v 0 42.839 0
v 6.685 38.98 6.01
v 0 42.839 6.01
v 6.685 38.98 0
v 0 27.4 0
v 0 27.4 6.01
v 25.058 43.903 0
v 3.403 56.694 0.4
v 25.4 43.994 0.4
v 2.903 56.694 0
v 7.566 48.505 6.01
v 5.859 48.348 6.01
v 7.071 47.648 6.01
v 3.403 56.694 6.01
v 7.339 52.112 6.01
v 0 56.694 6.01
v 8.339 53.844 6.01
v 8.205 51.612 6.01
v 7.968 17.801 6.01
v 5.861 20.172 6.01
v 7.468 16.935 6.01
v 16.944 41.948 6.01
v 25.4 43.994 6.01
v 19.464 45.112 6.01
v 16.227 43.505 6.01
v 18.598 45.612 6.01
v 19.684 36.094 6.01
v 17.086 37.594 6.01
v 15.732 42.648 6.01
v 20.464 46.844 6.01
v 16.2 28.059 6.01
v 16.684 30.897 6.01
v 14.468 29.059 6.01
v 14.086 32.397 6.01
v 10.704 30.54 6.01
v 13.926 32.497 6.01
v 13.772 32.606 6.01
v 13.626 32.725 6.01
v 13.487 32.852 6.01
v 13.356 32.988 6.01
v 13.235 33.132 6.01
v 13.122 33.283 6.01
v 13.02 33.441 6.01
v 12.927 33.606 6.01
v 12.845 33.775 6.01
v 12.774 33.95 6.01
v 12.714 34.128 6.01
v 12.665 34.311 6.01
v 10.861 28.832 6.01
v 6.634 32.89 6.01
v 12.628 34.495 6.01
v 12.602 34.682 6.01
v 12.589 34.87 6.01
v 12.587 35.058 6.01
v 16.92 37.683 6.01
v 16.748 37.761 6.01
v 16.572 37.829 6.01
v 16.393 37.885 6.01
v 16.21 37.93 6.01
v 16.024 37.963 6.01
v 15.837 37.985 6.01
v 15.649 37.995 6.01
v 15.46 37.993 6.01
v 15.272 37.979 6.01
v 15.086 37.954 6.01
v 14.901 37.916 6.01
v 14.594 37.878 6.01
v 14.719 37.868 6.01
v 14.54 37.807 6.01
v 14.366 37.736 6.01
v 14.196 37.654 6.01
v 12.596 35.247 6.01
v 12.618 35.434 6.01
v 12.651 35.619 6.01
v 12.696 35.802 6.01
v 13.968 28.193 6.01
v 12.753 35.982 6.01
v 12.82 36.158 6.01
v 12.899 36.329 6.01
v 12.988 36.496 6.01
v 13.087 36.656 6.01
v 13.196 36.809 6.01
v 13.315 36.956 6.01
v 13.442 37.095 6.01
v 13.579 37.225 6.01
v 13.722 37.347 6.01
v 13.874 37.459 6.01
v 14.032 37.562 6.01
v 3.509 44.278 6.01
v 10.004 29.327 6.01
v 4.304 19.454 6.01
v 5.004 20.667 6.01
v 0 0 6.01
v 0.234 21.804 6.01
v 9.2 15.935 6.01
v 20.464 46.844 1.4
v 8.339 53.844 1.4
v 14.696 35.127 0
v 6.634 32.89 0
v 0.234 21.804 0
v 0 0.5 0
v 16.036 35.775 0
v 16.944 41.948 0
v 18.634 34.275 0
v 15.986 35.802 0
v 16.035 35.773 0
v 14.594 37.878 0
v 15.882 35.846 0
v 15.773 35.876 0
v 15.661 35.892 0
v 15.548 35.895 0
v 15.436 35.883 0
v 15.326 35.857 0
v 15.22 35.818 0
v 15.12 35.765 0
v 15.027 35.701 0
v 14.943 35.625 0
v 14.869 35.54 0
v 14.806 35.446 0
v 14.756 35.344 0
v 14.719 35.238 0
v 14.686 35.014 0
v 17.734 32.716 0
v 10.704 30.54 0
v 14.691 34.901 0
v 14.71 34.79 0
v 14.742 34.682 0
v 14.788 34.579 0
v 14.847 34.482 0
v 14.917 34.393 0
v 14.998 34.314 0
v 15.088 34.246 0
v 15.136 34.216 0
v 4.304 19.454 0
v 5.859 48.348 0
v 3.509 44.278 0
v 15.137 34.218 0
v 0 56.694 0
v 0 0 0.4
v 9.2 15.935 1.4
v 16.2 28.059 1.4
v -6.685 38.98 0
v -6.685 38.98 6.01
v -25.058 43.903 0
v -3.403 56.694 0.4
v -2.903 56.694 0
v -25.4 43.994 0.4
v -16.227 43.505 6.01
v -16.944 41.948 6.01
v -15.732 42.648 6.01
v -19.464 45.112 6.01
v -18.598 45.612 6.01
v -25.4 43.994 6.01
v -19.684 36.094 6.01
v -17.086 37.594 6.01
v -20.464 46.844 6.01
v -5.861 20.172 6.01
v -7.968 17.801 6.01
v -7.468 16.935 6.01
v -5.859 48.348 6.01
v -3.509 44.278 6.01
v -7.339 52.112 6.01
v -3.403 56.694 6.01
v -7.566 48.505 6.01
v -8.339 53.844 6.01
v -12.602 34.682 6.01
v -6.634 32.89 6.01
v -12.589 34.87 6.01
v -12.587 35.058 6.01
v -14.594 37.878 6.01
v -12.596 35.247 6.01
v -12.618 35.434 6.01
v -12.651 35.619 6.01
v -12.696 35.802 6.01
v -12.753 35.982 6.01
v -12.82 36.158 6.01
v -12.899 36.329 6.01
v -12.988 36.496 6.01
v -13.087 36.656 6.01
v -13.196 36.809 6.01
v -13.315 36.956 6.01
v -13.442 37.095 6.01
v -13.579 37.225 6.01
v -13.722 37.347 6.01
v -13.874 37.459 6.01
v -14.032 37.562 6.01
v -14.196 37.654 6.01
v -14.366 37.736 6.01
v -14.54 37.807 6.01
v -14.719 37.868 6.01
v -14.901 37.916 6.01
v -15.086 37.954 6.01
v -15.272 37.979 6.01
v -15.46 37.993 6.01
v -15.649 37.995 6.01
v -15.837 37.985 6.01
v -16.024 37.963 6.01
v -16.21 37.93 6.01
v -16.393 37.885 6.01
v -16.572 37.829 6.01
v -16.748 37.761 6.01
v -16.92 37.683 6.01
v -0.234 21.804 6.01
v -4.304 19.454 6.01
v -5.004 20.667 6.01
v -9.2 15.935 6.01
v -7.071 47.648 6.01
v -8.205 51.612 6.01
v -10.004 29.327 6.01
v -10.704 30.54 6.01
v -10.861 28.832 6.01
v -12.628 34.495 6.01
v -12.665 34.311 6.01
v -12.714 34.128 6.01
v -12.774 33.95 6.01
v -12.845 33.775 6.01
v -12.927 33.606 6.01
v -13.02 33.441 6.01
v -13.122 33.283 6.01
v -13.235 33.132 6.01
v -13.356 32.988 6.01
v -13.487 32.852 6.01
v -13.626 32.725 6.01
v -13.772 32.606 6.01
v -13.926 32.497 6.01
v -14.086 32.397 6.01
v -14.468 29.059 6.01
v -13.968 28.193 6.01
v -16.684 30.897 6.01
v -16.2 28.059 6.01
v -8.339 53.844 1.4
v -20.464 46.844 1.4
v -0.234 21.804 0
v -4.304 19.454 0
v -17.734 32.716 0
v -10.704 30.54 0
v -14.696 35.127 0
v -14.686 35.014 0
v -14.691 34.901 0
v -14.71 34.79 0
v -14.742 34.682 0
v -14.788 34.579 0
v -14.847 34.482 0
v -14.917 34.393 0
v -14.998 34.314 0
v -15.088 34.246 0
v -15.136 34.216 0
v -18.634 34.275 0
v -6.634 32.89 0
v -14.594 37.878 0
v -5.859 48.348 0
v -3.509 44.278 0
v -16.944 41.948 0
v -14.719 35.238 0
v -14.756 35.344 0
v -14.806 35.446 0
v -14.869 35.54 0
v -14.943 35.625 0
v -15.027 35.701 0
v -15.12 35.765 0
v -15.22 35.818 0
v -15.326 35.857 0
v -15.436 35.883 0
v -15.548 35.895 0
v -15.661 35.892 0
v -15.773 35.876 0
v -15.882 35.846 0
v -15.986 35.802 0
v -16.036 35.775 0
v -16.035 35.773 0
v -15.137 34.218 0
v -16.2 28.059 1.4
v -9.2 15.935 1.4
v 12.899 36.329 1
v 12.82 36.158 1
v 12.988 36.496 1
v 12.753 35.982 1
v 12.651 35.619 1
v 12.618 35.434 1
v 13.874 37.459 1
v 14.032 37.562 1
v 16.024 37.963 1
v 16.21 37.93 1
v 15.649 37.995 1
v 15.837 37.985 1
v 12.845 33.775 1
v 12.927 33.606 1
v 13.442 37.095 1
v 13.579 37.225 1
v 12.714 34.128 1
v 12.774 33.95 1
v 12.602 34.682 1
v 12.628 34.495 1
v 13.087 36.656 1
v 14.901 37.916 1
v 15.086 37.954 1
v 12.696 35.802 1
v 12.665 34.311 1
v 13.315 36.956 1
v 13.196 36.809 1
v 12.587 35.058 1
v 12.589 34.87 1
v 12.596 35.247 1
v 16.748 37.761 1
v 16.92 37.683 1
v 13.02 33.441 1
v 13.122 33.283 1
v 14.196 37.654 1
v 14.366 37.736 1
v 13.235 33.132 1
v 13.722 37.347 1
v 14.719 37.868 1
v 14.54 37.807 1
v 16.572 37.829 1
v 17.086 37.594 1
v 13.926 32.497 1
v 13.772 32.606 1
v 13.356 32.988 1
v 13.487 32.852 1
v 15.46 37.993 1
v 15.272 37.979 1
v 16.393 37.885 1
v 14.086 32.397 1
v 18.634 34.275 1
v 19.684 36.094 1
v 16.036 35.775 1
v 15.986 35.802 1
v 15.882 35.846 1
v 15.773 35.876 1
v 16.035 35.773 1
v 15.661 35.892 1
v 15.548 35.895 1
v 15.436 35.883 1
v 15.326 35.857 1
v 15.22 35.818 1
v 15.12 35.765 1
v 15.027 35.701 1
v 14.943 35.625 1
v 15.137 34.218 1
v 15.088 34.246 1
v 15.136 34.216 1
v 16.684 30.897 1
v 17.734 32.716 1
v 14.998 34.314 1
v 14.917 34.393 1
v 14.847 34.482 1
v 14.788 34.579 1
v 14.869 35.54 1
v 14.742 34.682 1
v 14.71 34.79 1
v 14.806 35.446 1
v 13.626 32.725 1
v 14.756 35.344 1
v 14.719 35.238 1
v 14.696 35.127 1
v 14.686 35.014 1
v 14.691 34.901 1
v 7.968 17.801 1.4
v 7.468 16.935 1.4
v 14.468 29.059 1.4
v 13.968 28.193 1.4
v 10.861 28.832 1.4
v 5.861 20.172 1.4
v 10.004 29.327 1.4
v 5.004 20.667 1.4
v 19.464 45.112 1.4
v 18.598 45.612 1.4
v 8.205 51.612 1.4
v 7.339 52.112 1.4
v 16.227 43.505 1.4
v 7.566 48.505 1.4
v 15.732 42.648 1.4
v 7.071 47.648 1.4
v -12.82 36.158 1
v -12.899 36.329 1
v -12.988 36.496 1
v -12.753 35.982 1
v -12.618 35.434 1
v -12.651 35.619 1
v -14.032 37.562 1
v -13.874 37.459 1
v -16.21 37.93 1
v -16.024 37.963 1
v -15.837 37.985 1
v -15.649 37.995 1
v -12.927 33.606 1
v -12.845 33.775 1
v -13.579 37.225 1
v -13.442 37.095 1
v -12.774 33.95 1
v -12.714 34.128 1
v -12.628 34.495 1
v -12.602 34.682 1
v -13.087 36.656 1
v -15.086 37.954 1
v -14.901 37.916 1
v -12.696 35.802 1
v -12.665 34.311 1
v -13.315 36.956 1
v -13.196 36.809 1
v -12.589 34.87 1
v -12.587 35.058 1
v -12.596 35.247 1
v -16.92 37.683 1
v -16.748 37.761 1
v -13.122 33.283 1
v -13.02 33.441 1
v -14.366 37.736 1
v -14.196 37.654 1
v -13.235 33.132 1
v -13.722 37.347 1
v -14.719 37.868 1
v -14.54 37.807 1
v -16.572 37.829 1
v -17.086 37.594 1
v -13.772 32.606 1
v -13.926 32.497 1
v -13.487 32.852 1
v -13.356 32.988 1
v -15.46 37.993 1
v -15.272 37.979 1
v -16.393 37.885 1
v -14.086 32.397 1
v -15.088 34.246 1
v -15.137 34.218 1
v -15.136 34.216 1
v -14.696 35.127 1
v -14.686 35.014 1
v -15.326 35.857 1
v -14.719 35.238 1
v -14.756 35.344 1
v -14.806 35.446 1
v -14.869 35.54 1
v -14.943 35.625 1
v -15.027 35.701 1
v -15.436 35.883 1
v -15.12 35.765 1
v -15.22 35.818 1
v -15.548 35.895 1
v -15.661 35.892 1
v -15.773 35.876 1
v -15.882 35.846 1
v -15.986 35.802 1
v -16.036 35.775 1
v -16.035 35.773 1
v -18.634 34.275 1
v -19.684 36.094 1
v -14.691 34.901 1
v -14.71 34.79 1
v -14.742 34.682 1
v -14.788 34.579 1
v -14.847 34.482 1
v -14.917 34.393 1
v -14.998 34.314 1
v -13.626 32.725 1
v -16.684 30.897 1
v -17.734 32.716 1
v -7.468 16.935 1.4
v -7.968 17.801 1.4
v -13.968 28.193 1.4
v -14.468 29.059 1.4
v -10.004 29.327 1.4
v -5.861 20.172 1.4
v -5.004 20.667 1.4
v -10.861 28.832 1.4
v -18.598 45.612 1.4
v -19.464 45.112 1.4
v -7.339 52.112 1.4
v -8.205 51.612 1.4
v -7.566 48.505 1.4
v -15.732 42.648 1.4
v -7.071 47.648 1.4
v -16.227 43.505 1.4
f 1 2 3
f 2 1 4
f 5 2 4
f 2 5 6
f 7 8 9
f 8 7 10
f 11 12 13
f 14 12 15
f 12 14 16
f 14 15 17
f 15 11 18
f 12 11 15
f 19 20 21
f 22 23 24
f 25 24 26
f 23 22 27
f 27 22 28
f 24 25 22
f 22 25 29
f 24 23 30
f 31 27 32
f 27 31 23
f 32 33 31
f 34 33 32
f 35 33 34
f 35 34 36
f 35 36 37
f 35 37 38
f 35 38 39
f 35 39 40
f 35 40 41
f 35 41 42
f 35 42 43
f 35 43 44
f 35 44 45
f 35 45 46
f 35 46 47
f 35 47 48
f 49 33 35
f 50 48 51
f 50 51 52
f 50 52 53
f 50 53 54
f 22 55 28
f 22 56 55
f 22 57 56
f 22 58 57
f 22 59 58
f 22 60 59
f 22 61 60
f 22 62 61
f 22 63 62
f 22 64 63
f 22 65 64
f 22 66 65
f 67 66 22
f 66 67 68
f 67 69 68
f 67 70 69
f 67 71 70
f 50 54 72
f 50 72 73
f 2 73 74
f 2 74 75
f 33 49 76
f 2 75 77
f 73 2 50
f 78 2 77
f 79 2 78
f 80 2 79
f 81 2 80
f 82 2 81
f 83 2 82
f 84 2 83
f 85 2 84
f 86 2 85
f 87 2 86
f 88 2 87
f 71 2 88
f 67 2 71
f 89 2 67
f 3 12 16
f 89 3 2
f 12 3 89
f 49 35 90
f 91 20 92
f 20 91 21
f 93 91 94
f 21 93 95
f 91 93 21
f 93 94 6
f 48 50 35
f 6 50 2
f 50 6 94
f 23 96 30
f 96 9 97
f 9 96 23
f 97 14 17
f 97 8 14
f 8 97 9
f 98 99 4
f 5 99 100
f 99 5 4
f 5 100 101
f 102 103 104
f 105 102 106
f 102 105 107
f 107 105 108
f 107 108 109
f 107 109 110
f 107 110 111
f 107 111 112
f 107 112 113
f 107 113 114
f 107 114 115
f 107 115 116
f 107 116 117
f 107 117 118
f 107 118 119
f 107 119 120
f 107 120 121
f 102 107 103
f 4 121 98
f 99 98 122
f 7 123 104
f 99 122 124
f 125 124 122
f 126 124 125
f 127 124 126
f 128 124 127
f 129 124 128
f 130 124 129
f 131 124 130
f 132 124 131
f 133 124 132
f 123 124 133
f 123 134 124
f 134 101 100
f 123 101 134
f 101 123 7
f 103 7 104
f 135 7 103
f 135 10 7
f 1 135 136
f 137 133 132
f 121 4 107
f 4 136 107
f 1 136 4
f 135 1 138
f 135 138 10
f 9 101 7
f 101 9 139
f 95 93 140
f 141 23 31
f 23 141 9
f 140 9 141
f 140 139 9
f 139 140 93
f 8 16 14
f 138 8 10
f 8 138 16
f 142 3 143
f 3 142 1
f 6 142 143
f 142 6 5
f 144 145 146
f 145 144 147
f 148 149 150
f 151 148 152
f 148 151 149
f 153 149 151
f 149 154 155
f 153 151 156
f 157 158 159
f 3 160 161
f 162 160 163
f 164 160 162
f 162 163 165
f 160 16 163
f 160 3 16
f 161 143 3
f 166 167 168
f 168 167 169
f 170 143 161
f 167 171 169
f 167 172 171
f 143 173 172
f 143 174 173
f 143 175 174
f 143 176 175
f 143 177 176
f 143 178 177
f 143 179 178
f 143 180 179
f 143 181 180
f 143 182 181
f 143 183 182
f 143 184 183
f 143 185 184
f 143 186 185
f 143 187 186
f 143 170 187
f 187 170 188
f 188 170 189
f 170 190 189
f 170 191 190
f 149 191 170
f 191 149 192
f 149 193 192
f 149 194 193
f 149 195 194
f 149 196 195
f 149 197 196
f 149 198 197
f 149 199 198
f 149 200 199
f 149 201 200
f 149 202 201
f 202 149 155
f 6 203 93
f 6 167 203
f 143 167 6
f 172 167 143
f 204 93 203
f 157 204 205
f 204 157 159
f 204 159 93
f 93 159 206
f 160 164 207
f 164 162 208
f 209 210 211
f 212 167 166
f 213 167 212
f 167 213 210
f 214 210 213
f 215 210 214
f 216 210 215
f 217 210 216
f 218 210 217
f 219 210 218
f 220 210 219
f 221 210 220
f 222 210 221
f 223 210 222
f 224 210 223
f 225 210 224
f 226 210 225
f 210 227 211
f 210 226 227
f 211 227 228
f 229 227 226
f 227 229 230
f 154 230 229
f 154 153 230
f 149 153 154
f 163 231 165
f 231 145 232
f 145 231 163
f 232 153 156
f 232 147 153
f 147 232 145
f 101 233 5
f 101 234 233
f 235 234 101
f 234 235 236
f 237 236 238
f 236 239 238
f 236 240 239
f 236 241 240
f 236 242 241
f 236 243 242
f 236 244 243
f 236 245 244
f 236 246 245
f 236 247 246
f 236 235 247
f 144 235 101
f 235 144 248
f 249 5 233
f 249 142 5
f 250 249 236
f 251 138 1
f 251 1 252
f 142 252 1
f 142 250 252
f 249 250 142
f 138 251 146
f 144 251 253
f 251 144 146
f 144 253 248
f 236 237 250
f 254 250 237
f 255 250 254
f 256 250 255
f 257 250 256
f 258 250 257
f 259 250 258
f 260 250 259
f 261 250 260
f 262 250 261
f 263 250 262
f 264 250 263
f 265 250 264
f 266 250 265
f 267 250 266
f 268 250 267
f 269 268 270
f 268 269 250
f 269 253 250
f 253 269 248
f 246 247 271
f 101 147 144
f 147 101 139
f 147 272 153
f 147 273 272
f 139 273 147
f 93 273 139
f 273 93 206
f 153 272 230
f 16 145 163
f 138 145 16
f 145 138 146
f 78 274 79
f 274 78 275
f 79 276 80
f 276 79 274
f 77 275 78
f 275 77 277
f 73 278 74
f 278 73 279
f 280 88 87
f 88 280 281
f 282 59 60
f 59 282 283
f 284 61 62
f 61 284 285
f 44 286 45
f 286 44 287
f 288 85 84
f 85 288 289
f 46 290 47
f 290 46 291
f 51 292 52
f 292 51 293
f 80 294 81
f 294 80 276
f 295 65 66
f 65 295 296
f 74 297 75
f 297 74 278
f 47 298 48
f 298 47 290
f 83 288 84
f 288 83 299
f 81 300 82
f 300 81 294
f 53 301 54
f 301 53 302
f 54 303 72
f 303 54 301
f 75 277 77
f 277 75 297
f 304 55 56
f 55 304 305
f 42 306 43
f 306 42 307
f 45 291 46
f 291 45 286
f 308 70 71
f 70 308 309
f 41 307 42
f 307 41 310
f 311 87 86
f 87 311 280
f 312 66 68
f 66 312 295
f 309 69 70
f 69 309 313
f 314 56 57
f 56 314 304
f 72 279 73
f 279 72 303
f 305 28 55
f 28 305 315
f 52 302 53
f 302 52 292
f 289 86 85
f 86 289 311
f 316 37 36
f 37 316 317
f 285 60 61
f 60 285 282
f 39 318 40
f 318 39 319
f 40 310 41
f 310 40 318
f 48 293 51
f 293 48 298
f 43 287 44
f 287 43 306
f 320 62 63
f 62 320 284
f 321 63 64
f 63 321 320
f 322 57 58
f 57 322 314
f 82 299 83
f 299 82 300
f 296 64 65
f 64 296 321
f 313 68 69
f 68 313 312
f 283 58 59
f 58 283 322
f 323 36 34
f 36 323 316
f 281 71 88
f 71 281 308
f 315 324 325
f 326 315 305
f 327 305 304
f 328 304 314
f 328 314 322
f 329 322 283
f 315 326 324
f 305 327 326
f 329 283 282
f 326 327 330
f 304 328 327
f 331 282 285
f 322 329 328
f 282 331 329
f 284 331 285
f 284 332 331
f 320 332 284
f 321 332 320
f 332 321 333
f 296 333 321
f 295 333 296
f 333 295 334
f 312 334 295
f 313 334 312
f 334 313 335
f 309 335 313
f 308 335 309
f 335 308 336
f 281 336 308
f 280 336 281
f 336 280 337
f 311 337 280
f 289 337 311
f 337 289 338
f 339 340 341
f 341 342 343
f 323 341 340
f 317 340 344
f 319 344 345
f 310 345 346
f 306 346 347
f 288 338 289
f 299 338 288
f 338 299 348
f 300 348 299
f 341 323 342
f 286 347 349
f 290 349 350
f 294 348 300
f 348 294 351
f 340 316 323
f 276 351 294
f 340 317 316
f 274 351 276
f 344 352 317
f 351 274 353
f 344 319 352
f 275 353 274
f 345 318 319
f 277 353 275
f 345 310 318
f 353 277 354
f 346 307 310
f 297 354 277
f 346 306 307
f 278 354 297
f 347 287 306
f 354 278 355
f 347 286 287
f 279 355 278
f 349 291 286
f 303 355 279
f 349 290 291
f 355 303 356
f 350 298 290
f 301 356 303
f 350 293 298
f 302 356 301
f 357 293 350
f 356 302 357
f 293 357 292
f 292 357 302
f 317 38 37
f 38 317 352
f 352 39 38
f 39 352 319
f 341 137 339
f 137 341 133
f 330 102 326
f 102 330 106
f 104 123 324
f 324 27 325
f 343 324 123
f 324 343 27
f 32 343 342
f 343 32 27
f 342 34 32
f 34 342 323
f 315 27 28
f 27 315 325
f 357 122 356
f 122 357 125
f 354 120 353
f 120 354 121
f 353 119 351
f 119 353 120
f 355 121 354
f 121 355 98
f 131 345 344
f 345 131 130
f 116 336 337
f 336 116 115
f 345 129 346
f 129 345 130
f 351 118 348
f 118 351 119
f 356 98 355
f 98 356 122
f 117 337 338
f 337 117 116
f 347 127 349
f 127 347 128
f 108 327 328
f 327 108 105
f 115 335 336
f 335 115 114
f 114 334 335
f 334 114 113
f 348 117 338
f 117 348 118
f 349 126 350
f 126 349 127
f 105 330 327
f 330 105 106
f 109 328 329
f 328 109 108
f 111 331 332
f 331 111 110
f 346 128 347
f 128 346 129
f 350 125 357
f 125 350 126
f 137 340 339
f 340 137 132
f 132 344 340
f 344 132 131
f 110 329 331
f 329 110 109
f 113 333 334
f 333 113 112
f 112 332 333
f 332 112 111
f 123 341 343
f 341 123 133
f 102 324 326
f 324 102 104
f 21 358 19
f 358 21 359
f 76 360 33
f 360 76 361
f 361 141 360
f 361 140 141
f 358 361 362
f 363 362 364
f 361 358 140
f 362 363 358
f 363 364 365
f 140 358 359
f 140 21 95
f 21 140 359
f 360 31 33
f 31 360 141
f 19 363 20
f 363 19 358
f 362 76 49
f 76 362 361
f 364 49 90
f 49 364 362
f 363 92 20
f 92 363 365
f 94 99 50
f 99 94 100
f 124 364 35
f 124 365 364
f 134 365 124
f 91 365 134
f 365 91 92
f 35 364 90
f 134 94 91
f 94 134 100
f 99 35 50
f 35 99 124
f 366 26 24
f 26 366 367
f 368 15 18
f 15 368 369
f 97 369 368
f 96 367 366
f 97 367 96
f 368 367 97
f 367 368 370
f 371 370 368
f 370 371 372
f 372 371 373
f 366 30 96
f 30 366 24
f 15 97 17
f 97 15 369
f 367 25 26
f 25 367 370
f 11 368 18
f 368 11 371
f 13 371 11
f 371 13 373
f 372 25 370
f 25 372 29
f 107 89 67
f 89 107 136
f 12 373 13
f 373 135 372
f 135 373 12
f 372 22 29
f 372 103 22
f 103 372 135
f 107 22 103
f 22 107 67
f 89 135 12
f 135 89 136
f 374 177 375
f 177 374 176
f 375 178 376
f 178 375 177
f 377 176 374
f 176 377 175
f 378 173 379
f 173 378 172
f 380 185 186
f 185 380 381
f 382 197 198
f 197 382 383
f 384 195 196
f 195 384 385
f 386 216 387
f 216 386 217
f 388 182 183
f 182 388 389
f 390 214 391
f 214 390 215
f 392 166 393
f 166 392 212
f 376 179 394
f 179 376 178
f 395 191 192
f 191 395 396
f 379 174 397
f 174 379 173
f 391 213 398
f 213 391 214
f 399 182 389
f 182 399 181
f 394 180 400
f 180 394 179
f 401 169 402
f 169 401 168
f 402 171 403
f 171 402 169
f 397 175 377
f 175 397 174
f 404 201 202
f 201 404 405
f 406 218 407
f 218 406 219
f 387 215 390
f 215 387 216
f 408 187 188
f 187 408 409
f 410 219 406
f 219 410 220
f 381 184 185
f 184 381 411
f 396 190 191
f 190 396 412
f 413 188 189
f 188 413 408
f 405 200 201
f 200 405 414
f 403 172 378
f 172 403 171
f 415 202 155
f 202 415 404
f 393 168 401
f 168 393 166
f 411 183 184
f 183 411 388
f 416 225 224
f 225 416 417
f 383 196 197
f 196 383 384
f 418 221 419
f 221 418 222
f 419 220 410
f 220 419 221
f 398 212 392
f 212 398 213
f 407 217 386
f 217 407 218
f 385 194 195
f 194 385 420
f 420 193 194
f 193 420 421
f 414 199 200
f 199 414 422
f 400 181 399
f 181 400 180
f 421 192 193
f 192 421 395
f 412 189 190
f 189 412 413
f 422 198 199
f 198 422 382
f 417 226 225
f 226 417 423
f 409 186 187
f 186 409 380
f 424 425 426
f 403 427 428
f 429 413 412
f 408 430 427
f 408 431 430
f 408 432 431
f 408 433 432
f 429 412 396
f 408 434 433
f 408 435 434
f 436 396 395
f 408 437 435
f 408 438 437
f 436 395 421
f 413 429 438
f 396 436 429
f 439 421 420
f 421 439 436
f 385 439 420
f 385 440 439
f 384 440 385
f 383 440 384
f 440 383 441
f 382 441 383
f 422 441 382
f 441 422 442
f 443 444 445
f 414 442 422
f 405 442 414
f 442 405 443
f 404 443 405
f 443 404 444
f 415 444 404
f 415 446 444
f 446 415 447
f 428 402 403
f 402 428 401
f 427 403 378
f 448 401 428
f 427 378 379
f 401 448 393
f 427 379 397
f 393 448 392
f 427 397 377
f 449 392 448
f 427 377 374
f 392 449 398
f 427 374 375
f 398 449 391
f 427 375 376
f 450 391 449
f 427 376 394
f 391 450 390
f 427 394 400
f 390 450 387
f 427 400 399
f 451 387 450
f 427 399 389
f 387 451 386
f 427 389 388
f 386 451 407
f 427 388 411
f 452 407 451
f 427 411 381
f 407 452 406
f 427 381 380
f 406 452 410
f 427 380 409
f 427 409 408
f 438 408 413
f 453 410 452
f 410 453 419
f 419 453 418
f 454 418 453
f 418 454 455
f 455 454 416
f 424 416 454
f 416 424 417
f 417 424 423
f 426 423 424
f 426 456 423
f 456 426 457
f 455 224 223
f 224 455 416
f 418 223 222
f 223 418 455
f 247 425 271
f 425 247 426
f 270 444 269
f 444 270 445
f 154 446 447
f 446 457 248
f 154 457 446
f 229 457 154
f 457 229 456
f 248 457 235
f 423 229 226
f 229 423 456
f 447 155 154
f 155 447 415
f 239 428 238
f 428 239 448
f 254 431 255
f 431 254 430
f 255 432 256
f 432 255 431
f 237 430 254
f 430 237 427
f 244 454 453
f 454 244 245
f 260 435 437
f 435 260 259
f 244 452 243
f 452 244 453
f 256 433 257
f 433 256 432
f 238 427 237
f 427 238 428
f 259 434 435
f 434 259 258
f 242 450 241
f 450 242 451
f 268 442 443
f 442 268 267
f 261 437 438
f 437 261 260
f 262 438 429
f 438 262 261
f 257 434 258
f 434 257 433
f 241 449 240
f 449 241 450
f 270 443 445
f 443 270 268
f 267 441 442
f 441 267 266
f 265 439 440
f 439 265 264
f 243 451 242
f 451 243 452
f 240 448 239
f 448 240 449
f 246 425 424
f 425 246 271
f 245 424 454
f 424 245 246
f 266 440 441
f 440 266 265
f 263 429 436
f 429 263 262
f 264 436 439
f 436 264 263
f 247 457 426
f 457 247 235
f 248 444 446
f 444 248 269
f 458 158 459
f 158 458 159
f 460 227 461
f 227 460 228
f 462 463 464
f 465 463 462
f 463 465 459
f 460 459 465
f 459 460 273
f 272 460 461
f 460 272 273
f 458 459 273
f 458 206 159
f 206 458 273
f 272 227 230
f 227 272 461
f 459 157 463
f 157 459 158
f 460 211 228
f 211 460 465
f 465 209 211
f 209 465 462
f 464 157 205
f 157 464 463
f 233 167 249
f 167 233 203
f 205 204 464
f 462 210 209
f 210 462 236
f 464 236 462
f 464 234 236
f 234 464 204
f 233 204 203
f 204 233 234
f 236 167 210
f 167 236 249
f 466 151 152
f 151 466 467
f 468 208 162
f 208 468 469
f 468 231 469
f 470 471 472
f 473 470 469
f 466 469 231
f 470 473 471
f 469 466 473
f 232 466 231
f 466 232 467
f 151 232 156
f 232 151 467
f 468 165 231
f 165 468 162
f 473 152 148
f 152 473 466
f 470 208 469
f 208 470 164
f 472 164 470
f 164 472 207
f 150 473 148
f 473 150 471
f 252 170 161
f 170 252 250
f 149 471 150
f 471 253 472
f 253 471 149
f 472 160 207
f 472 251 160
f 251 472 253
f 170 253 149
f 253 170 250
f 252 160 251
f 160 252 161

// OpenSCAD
// file: lock_flex_magnetic.scad
/*
 * Flex Magnet
 */
module flex_magnetic_positive(magnet_hole=6, height=6) {
    if (magnet_hole > 0) {
        translate([magnet_hole/2+1,0,0]) cylinder(.41,magnet_hole/2+1-.25,magnet_hole/2+1, $fn=100);
        translate([magnet_hole/2+1,0,0.4]) cylinder(height-.4,magnet_hole/2+1,magnet_hole/2+1, $fn=100);
        hull() {
            translate([0.25,-magnet_hole/2-1+.25,0]) cube([magnet_hole/2+1-.25,magnet_hole+2-.5,1]);
            translate([0,-magnet_hole/2-1,.4]) cube([magnet_hole/2+1,magnet_hole+2,height-.4]);
        }
    }
}

module flex_magnetic_negative(magnet_hole=6, height=6) {
    if (magnet_hole > 0) {
        translate([magnet_hole/2+1,0,1]) cylinder(height+2,magnet_hole/2,magnet_hole/2, $fn=100);
        translate([1,-magnet_hole/2,1]) cube([magnet_hole/2,magnet_hole,height+2]);
        translate([magnet_hole/2+1,0,-1]) cylinder(10,.9,.9,$fn=50);
        translate([1,-.9,-1]) cube([magnet_hole/2,.9*2,10]);
    }
}

module flex_magnetic_hex(square_basis, magnet_hole=6, height=6) {
    if (magnet_hole > 0) {
        hull() {
            translate([square_basis/2,0,0]) rotate([0,0,90]) translate([magnet_hole/2+1,0,1]) cylinder(height+2,magnet_hole/2,magnet_hole/2, $fn=100);
            rotate([0,0,-120]) mirror([1,0,0]) translate([square_basis/2,0,0]) rotate([0,0,90]) translate([magnet_hole/2+1,0,1]) cylinder(height+2,magnet_hole/2,magnet_hole/2, $fn=100);
        }
        translate([square_basis/2,0,0]) rotate([0,0,90]) union() {
            //translate([magnet_hole/2+1,0,1]) cylinder(8,magnet_hole/2,magnet_hole/2, $fn=100);
            translate([1,-magnet_hole/2,1]) cube([magnet_hole/2,magnet_hole,height+2]);
            translate([magnet_hole/2+1,0,-1]) cylinder(10,.9,.9,$fn=50);
            translate([1,-.9,-1]) cube([magnet_hole/2,.9*2,10]);
        }
        rotate([0,0,-120]) mirror([1,0,0]) translate([square_basis/2,0,0]) rotate([0,0,90]) union() {
            //translate([magnet_hole/2+1,0,1]) cylinder(8,magnet_hole/2,magnet_hole/2, $fn=100);
            translate([1,-magnet_hole/2,1]) cube([magnet_hole/2,magnet_hole,height+2]);
            translate([magnet_hole/2+1,0,-1]) cylinder(10,.9,.9,$fn=50);
            translate([1,-.9,-1]) cube([magnet_hole/2,.9*2,10]);
        }
    }
}
// file: lock_magnetic.scad
/*
 * Magnets
 */
 
module magnetic_positive(magnet_hole=6, height=6) {
    if (magnet_hole > 0) {
        translate([magnet_hole/2+1,0,0]) cylinder(.41,magnet_hole/2+1-.25,magnet_hole/2+1, $fn=100);
        translate([magnet_hole/2+1,0,0.4]) cylinder(height-.4,magnet_hole/2+1,magnet_hole/2+1, $fn=100);
    }
}

module magnetic_negative(magnet_hole=6, height=8) {
    if (magnet_hole > 0) {
        translate([magnet_hole/2+1,0,1]) cylinder(height+2,magnet_hole/2,magnet_hole/2, $fn=100);
        translate([magnet_hole/2+1,0,-1]) cylinder(10,.9,.9,$fn=50);
    }
}
// file: lock_openlock_topless.scad
/*
 * Openlock Topless connection bay
 */

module openlock_topless_chamber(buffer=0, height=6) {
    translate([-buffer,-7,1.4]) cube([2+buffer,7*2,height+1]);
    hull() {
        translate([0,-6,1.4]) cube([2,6*2,height+1]);
        translate([3+0.01,-5,1.4]) cube([2,5*2,height+1]);
    }
    hull() {
        translate([5,-5,1.4]) cube([1,5*2,height+1]);
        translate([6,-5,1.4]) cube([1,5*2,height+1]);
    }
    translate([6,-6.4,-1]) cube([4.7,6.4*2,height+3.4]);
}

module openlock_topless_positive(height=6) {
    translate([0,-8,0.4]) cube([2,16,height-.4]); 
}

module openlock_topless_negative(supports=true, height=6) {
    difference() {
        openlock_topless_chamber(1, height=height);
    }
}
// file: lock_openlock.scad
/*
 * Openlock connection bay
 */

module openlock_chamber(buffer=0) {
    add = TOPLESS == "true" ? 10 : 0;
    translate([-buffer,-7,1.4]) cube([2+buffer,7*2,4.2+add]);
    hull() {
        translate([0,-6,1.4]) cube([2,6*2,4.2+add]);
        translate([3+0.01,-5,1.4]) cube([2,5*2,4.2+add]);
    }
    hull() {
        translate([5,-5,1.4]) cube([1,5*2,4.2+add]);
        translate([6,-5,1.4]) cube([1,5*2,4.7]);
    }
    translate([6,-6.4,-1]) cube([4.7,6.4*2,7.1]);
}

module openlock_supports() {
    module support() {
        translate([-1.1,2.05,1.2]) cube([3.1,1,4.6]);
        hull() {
            translate([-1.1,2.05,1.4]) cube([3.1,1,2.1]);
            translate([-1.1,2.05-.2,1.9]) cube([3.1,1.4,1.1]);
        }
        hull() {
            translate([-1.1,2.05,3.5]) cube([3.1,1,2.1]);
            translate([-1.1,2.05-.2,4.0]) cube([3.1,1.4,1.1]);
        }
    }
    if (TOPLESS != "true") {
        support();
        mirror([0,1,0]) support();
    }
}

module openlock_positive() {
    translate([0,-8,0.4]) cube([2,16,5.6]); 
}

module openlock_negative(supports=true) {
    difference() {
        openlock_chamber(1);
        if(supports == "true") {
            openlock_supports();
        }
    }
}

module openlock_wall_negative(supports=true) {
    translate([0,0,0]) difference() {
        translate([0,0,1.4]) linear_extrude(height=4.2) {
            polygon([
                [-7.35,7],[-5.35,7],[-5.35,6],
                [-2.35,5],[2.35,5],
                [5.35,6],[5.35,7],[7.35,7],
                [7.35,-7],[5.35,-7],[5.35,-6],
                [2.35,-5],[-2.35,-5],
                [-5.35,-6],[-5.35,-7],[-7.35,-7]]);
        }
        if(supports) {
            translate([-6.35,0,0]) openlock_supports();
            rotate([0,0,180]) translate([-6.35,0,0]) openlock_supports();
        }
    }
}

module openlock_wall_positive() {
    translate([-6.35,-8,0.4]) cube([12.7,16,5.6]); 
}

module openlock_sidelock_negative() {
    
    translate([0,0,7]) rotate([90,0,0]) translate([0,0,-2.1]) linear_extrude(height=4.2) {
        polygon([[-1,-7],[-1,7],[2,7],[2,6],[5,5],[5.9,5],[5.9,5.26],[5.9+4.53,5.26],
            [5.9+4.53,-5.26],[5.9,-5.26],[5.9,-5],[5,-5],[2,-6],[2,-7]]);
    }
}

module openlock_sidelock_positive() {
    translate([0,-3.1,-8]) cube([11.43,6.2,16]);
}
// file: lock_infinitylock.scad
/*
 * Infinity Lock connection bay
 */
module infinitylock_positive() {
    translate([0,-6.6,0.4]) cube([2,6.6*2,5.6]); 
}

module infinitylock_negative() {
    translate([-1,-5.6,1.4]) cube([2.6,5.6*2,4.2]);

    hull() {
        translate([0,-3.83,1.4]) cube([1.6,3.83*2,4.2]);
        translate([0,-3.36,1.4]) cube([2.15,3.36*2,4.2]);
    }
    translate([0,-3.36,1.4]) cube([2.8,3.36*2,4.2]);
    hull() {
        translate([2.7,-3.36,1.4]) cube([2.7,3.36*2,4.2]);
        translate([3.84,-3.83,1.4]) cube([1,3.83*2,4.2]);
    }
    translate([4.8,-3.83,-1]) cube([3.44,3.83*2,6.6]);
}
// file: lock_dragonlock.scad
/*
 * Dragonlock connection bay
 */

module dragonlock_interior_a(north=true,south=true,east=true,west=true) {
    module edge() {
        difference() {
            hull() {
                translate([3.17,-12.67,-1]) cube([8.512,12.67*2,6]);
                translate([3.145,-12.7,-1]) cube([8.512,12.67*2,6.206]);
            }
            translate([10.29,-12.8,5.206]) rotate([0,45,0]) cube([8.512,12.8*2,6.206]);
        }
    }
    
    translate([0,25.4,0]) {
        difference() {
            translate([12.7,-12.7,-1]) cube([50.8-12.7*2,50.8-12.7*2,6.206]);
            translate([25.4,0,0]) rotate([0,0,45]) translate([-.75,-30,-2]) cube([1.5,60,20]);
            translate([25.4,0,0]) rotate([0,0,-45]) translate([-.75,-30,-2]) cube([1.5,60,20]);
        }

        if (!west) {
            edge();
        }
        if (!south) {
            translate([25.4,-25.4,0]) rotate([0,0,90]) edge();
        }
        if (!east) {
            translate([50.8,0,0]) rotate([0,0,180]) edge();
        }
        if (!north) {
            translate([25.4,25.4,0]) rotate([0,0,270]) edge();
        }
        dragonlock_nub();
        translate([25.4,-25.4,0]) rotate([0,0,90]) dragonlock_nub();
        translate([50.8,0,0]) rotate([0,0,180]) dragonlock_nub();
        translate([25.4,25.4,0]) rotate([0,0,270]) dragonlock_nub();
    }
}

module dragonlock_interior_b(north=true,south=true,east=true,west=true) {
    translate([0,25.4,0]) {
        if (west) {
            dragonlock_negative();
        }
        if (south) {
            translate([25.4,-25.4,0]) rotate([0,0,90]) dragonlock_negative();
        }
        if (east) {
            translate([50.8,0,0]) rotate([0,0,180]) dragonlock_negative();
        }
        if (north) {
            translate([25.4,25.4,0]) rotate([0,0,270]) dragonlock_negative();
        }
    }
}


module dragonlock_positive() {
    translate([0,-7.8418,0.4]) cube([2,7.8418*2,5.6]);
}

module dragonlock_negative(supports=true) {
    difference() {
        union() {
            translate([-1,-6.8418,1.3695]) cube([5.1,6.8418*2,3.225]);
            hull() {
                translate([3.17,-7.62,-1]) cube([7.9634,7.62*2,4.81]);
                translate([3.17,-7.62,-1]) cube([7.735,7.62*2,5.5945]);
            }
        }
        if(supports) {
            translate([-1.1,-.25,0]) cube([4.262,.5,5]);
            translate([-1.1,3.59-.25,0]) cube([7.1,.5,5]);
            translate([-1.1,-3.59-.25,0]) cube([7.1,.5,5]);
        }
        translate([3,-3.9095,-1.1]) cube([10,3.9095*2,2.4695]);
        translate([3,-4.7685,-1.1]) rotate([0,0,39.15]) cube([5,5,2.4695]);
        mirror([0,1,0]) translate([3,-4.7685,-1.1]) rotate([0,0,39.15]) cube([5,5,2.4695]);
        translate([7,-2.12,-1]) cube([5,2.12*2,10]);
        translate([8.069,0,-1]) cylinder(10,2.815,2.811,$fn=50);

        difference() {
            translate([8.069,0,-1.1]) cylinder(2.4695,4.62,4.62,$fn=50);
            translate([3,-5,-1.2]) cube([10,10,1.2]);
        }
    }
}
// file: impl_square.scad
include <connectors.scad>

/*
 * Connector Positive
 */
module connector_positive_square(x,y,square_basis,edge_width,north=true,south=true,east=true,west=true) {
    for ( i = [0 : y-1] ) {
        if(west) {
            translate([0,square_basis*(i+1)-square_basis/2,0]) center_connector_positive(y);
        }
        if(east) {
            translate([square_basis*x,square_basis*(i+1)-square_basis/2,0]) rotate([0,0,180]) center_connector_positive(y);
        }
    }
    if (y > 1) {
        for ( i = [1 : y-1] ) {
            if(west) {
                translate([0,square_basis*i,0]) joint_connector_positive(y);
            }
            if(east) {
                translate([square_basis*x,square_basis*i,0]) rotate([0,0,180]) joint_connector_positive(y);
            }
        }
    }
    for ( i = [0 : x-1] ) {
        if(south) {
            translate([square_basis*(i+1)-square_basis/2,0,0]) rotate([0,0,90]) center_connector_positive(x);
        }
        if(north) {
            translate([square_basis*(i+1)-square_basis/2,square_basis*y,0]) rotate([0,0,-90]) center_connector_positive(x);
        }
    }
    if (x > 1) {
        for ( i = [1 : x-1] ) {
            if(south) {
                translate([square_basis*i,0,0]) rotate([0,0,90]) joint_connector_positive(y);
            }
            if(north) {
                translate([square_basis*i,square_basis*y,0]) rotate([0,0,-90]) joint_connector_positive(y);
            }
        }
    }
}

module connector_positive_square_notch(x,y,square_basis,edge_width,north=true,south=true,east=true,west=true) {
    if(NOTCH == "true") {
        connector_positive_square(x,y,square_basis,edge_width,north=north,south=false,east=east,west=false);
        if(south) {
            translate([square_basis*NOTCH_X,0,0]) connector_positive_square(x-NOTCH_X,y-NOTCH_Y,square_basis,edge_width,north=false,south=true,east=false,west=false);
            translate([0,square_basis*NOTCH_Y,0]) connector_positive_square(NOTCH_X,NOTCH_Y,square_basis,edge_width,north=false,south=true,east=false,west=false);
        }
        if(west) {
            translate([square_basis*NOTCH_X,0,0]) connector_positive_square(NOTCH_X,NOTCH_Y,square_basis,edge_width,north=false,south=false,east=false,west=true);
            translate([0,square_basis*NOTCH_Y,0]) connector_positive_square(x-NOTCH_X,y-NOTCH_Y,square_basis,edge_width,north=false,south=false,east=false,west=true);
        }
    } else {
        connector_positive_square(x,y,square_basis,edge_width,north,south,east,west);
    }
}

/*
 * Connector Negative
 */
module connector_negative_square(x,y,square_basis,edge_width,north=true,south=true,east=true,west=true, priority=PRIORITY, lock=LOCK, magnets=MAGNETS, magnet_hole=MAGNET_HOLE, height=HEIGHT) {
    for ( i = [0 : y-1] ) {
        if(west) {
            translate([0,square_basis*(i+1)-square_basis/2,0]) center_connector_negative(y, priority, lock, magnets, magnet_hole, height=height);
        }
        if(east) {
            translate([square_basis*x,square_basis*(i+1)-square_basis/2,0]) rotate([0,0,180]) center_connector_negative(y, priority, lock, magnets, magnet_hole, height=height);
        }
    }
    if (y > 1) {
        for ( i = [0 : ceil(y)-2] ) {
            if(west) {
                translate([0,square_basis*(i+1),0]) joint_connector_negative(y, height=height, lock=lock);
            }
            if(east) {
                translate([square_basis*x,square_basis*(i+1),0]) rotate([0,0,180]) joint_connector_negative(y, height=height, lock=lock);
            }
        }
    }
    for ( i = [0 : x-1] ) {
        if(south) {
            translate([square_basis*(i+1)-square_basis/2,0,0]) rotate([0,0,90]) center_connector_negative(x, priority, lock, magnets, magnet_hole, height=height);
        }
        if(north) {
            translate([square_basis*(i+1)-square_basis/2,square_basis*y,0]) rotate([0,0,-90]) center_connector_negative(x, priority, lock, magnets, magnet_hole, height=height);
        }
    }
    if (x > 1) {
        for ( i = [0 : ceil(x)-2] ) {
            if(south) {
                translate([square_basis*(i+1),0,0]) rotate([0,0,90]) joint_connector_negative(y, height=height, lock=lock);
            }
            if(north) {
                translate([square_basis*(i+1),square_basis*y,0]) rotate([0,0,-90]) joint_connector_negative(y, height=height, lock=lock);
            }
        }
    }
}

module connector_negative_square_notch(x,y,square_basis,edge_width,north=true,south=true,east=true,west=true) {
    if(NOTCH == "true") {
        connector_negative_square(x,y,square_basis,edge_width,north=north,south=false,east=east,west=false);
        if(south) {
            translate([square_basis*NOTCH_X,0,0]) connector_negative_square(x-NOTCH_X,y-NOTCH_Y,square_basis,edge_width,north=false,south=true,east=false,west=false);
            translate([0,square_basis*NOTCH_Y,0]) connector_negative_square(NOTCH_X,NOTCH_Y,square_basis,edge_width,north=false,south=true,east=false,west=false);
        }
        if(west) {
            translate([square_basis*NOTCH_X,0,0]) connector_negative_square(NOTCH_X,NOTCH_Y,square_basis,edge_width,north=false,south=false,east=false,west=true);
            translate([0,square_basis*NOTCH_Y,0]) connector_negative_square(x-NOTCH_X,y-NOTCH_Y,square_basis,edge_width,north=false,south=false,east=false,west=true);
        }
    } else {
        connector_negative_square(x,y,square_basis,edge_width,north,south,east,west);
    }
}

/*
 * Plain base exterior
 */
module plain_square(x,y,square_basis,edge_width) {
    difference() {
        plain_square_positive(x,y,square_basis);
        edge = LOCK == "dragonlock" ? square_basis/2 : edge_width;
        plain_square_negative(x,y,square_basis,edge);
    }
}

module plain_square_positive(x,y,square_basis) {
    difference() {
        hull() {
            translate([0,0,0.4]) cube([square_basis*x, square_basis*y, HEIGHT-.39]);
            translate([0.25,0.25,0]) cube([square_basis*x-.5, square_basis*y-.5, 1]);
        }
        if(NOTCH == "true") {
            translate([-1,-1,-1]) cube([square_basis*NOTCH_X+1, square_basis*NOTCH_Y+1, 8]);
            hull() {
                translate([-1,-1,0]) cube([square_basis*NOTCH_X+1, square_basis*NOTCH_Y+1, .4]);
                translate([-1,-1,-0.01]) cube([square_basis*NOTCH_X+1.25, square_basis*NOTCH_Y+1.25, 0.01]);
            }
        }
    }
}

module plain_square_negative(x,y,square_basis,edge_width) {
    difference() {
        intersection() {
            translate([edge_width,edge_width,0]) translate([1,1,-1]) cube([square_basis*x-((edge_width+1)*2),square_basis*y-((edge_width+1)*2),HEIGHT+2]);
            difference() {
                translate([edge_width,edge_width,0]) translate([1,1,-1]) cube([square_basis*x-((edge_width+1)*2),square_basis*y-((edge_width+1)*2),HEIGHT+2]);
                if(NOTCH == "true") {
                    translate([0,0,0.4]) cube([square_basis*NOTCH_X+edge_width+1, square_basis*NOTCH_Y+edge_width+1, HEIGHT]);
                    translate([0.25,.25,0]) cube([square_basis*NOTCH_X+edge_width+1-.5, square_basis*NOTCH_Y+edge_width+1-.5, .4]);
                }
            }
        }
        if (CENTER == "grid") {
            for ( i = [2 : 2 : y-1] ) {
                translate([0,(i-.125)*square_basis,-2]) cube([square_basis*x,square_basis/4,HEIGHT+4]);
            }
            for ( i = [2 : 2 : x-1] ) {
                translate([(i-.125)*square_basis,0,-2]) cube([square_basis/4,square_basis*y,HEIGHT+4]);
            }
        } else if (CENTER == "cube") {
            translate([0,(-.125)*square_basis,-2]) cube([square_basis*x,square_basis*y,HEIGHT+4]);
        }
    }
}
// file: impl_hex_corner.scad
include <impl_square.scad>

module plain_angled_corner_60(square_basis,edge_width) {
    module half() {
        difference() {
            rotate([0,0,60]) difference() {
                plain_square(2,2,square_basis,edge_width);
                translate([square_basis*2,square_basis*1,-1]) rotate([0,0,30]) cube([square_basis*1+2, square_basis*2+2, HEIGHT+2]);
            }
            rotate([0,0,90]) translate([0,0,-1]) cube([square_basis*3,square_basis*3,8]);
        }
    }
    half();
    mirror([1,0,0]) half();
}

module connector_angled_corner_60_positive(square_basis,edge_width) {
    module half() {
        rotate([0,0,60]) {
            connector_positive_strip(2, square_basis, edge_width, left=false, right=true);
            translate([square_basis*2,0,0]) rotate([0,0,90]) connector_positive_strip(1, square_basis, edge_width);
        }
    }
    half();
    mirror([1,0,0]) half();
}

module connector_angled_corner_60_negative(square_basis,edge_width) {
    module half() {
        rotate([0,0,60]) {
            connector_negative_strip(2, square_basis, edge_width, left=false, right=true);
            translate([square_basis*2,0,0]) rotate([0,0,90]) connector_negative_strip(1, square_basis, edge_width);
        }
    }
    half();
    mirror([1,0,0]) half();
}

module plain_angled_corner_120(square_basis,edge_width) {
    module half() {
        difference() {
            rotate([0,0,30]) translate([-square_basis,0,0]) plain_square(2,1,square_basis,edge_width);
            rotate([0,0,90]) translate([-square_basis,0,-1]) cube([square_basis*3,square_basis*3,8]);
        }
    }
    half();
    mirror([1,0,0]) half();
}

module connector_angled_corner_120_positive(square_basis,edge_width) {
    module half() {
        rotate([0,0,30]) {
            connector_positive_strip(1, square_basis, edge_width, left=false, right=true);
            translate([square_basis,0,0]) rotate([0,0,90]) connector_positive_strip(1, square_basis, edge_width);
        }
    }
    half();
    mirror([1,0,0]) half();
}

module connector_angled_corner_120_negative(square_basis,edge_width) {
    module half() {
        rotate([0,0,30]) {
            connector_negative_strip(1, square_basis, edge_width, left=false, right=true);
            translate([square_basis,0,0]) rotate([0,0,90]) connector_negative_strip(1, square_basis, edge_width);
        }
    }
    half();
    mirror([1,0,0]) half();
}

module plain_angled_corner_240(square_basis,edge_width) {
    module half() {
        difference() {
            rotate([0,0,-30]) translate([-square_basis,0,0]) plain_square(2,1,square_basis,edge_width);
            rotate([0,0,90]) translate([-square_basis,0,-1]) cube([square_basis*3,square_basis*3,8]);
        }
    }
    half();
    mirror([1,0,0]) half();
}

module connector_angled_corner_240_positive(square_basis,edge_width) {
    module half() {
        rotate([0,0,-30]) {
            connector_positive_strip(1, square_basis, edge_width, left=false, right=true);
            translate([square_basis,0,0]) rotate([0,0,90]) connector_positive_strip(1, square_basis, edge_width);
        }
    }
    half();
    mirror([1,0,0]) half();
}

module connector_angled_corner_240_negative(square_basis,edge_width) {
    module half() {
        rotate([0,0,-30]) {
            connector_negative_strip(1, square_basis, edge_width, left=false, right=true);
            translate([square_basis,0,0]) rotate([0,0,90]) connector_negative_strip(1, square_basis, edge_width);
        }
    }
    half();
    mirror([1,0,0]) half();
}
// main file
/* [Base Tile Size] */
// Angle of corner
ANGLE = 60; // [60,120,240,300]
// How tall is the tile in mm on the Z axis
HEIGHT = 6; // 6 is default

/* [Square Basis] */
// What is the size in mm of a square?
SQUARE_BASIS = "inch"; // [25mm:25mm - Dwarven Forge/Hirstarts, inch:inch (25.4) - OpenLOCK/Dragonlock/Dungeonworks, wyloch:1 1/4 inch (31.75) - Wyloch, drc:1 1/2 inch (38.1) - Dragon's Rest]

/* [Lock] */
// Dragonlock - connector between squares, pips on either side for stacking
// InfinityLock - connector between squares and in the middle of squares
// OpenLOCK - connector between squares
// OpenLOCK Triplex - connector between squares and in the middle of squares
// OpenLOCK Topless - openlock, but without a top
// Select the type of clip lock
LOCK = "openlock";// [openlock,triplex,infinitylock,dragonlock,none]
// If OpenLock remove top of openlock bays
TOPLESS = "true"; // [true, false]
// If OpenLock, do we want supports?
SUPPORTS = "true"; // [true, false]

 /* [Magnets] */
// Use magnets or not.
MAGNETS = "flex_magnetic"; // [magnetic,flex_magnetic,none]
// Size of hole for magnet.  6 works well for 5mm buckyball style magnets.
MAGNET_HOLE = 6;

/* [Priority] */
// Do you want lock or magnets to win when the two conflict
PRIORITY = "lock"; // [lock,magnets]

/* [Center Options] */
// Keep center clear or fill it in
CENTER = "false"; // [cube, false]


include <impl_hex_corner.scad>

/*
 * Top Level Function
 */
module base_square(angle,square_basis) {
    tmp_edge_width = MAGNET_HOLE >= 5.55 ? MAGNET_HOLE + 1 : 6.55;

    if (angle == 60) {
        edge_width = square_basis/2 ;
        difference() {
            union() {
                plain_angled_corner_60(square_basis,edge_width);
                connector_angled_corner_60_positive(square_basis,edge_width) ;
            }
            connector_angled_corner_60_negative(square_basis,edge_width);
        }
    } else if (angle == 120 || angle == 300) {
        edge_width = tmp_edge_width;
        difference() {
            union() {
                plain_angled_corner_120(square_basis,edge_width);
                connector_angled_corner_120_positive(square_basis,edge_width) ;
            }
            connector_angled_corner_120_negative(square_basis,edge_width);
        }
    } else if (angle == 240) {
        edge_width = tmp_edge_width;
        difference() {
            union() {
                plain_angled_corner_240(square_basis,edge_width);
                connector_angled_corner_240_positive(square_basis,edge_width) ;
            }
            connector_angled_corner_240_negative(square_basis,edge_width);
        }
    }
}

function keyLookup (data, key) = search(key, data, num_returns_per_match=1)[0];

ELECTRONICS = "false";
NOTCH = "false";
NOTCH_X = 2;
NOTCH_Y = 2;

basis = [
    ["25mm", 25],
    ["inch", 25.4],
    ["wyloch", 31.75],
    ["drc", 38.1]
];
square_basis_number = basis[keyLookup(basis, [SQUARE_BASIS])][1];
wall_width = 10.2*square_basis_number/25;

// Compatability
valid_dragonlock_basis = (SQUARE_BASIS == "inch");
valid_infinitylock_basis = (SQUARE_BASIS == "inch");

if (LOCK == "dragonlock" && !valid_dragonlock_basis) {
    echo("ERROR: dragonlock is only compatible with inch basis");
} else if (LOCK == "infinitylock" && !valid_infinitylock_basis) {
    echo("ERROR: infinitylock is only compatible with inch basis");
} else {
    color("Grey") base_square(ANGLE,square_basis_number);
}

//plain_base(x,y,square_basis_number,shape,7);
